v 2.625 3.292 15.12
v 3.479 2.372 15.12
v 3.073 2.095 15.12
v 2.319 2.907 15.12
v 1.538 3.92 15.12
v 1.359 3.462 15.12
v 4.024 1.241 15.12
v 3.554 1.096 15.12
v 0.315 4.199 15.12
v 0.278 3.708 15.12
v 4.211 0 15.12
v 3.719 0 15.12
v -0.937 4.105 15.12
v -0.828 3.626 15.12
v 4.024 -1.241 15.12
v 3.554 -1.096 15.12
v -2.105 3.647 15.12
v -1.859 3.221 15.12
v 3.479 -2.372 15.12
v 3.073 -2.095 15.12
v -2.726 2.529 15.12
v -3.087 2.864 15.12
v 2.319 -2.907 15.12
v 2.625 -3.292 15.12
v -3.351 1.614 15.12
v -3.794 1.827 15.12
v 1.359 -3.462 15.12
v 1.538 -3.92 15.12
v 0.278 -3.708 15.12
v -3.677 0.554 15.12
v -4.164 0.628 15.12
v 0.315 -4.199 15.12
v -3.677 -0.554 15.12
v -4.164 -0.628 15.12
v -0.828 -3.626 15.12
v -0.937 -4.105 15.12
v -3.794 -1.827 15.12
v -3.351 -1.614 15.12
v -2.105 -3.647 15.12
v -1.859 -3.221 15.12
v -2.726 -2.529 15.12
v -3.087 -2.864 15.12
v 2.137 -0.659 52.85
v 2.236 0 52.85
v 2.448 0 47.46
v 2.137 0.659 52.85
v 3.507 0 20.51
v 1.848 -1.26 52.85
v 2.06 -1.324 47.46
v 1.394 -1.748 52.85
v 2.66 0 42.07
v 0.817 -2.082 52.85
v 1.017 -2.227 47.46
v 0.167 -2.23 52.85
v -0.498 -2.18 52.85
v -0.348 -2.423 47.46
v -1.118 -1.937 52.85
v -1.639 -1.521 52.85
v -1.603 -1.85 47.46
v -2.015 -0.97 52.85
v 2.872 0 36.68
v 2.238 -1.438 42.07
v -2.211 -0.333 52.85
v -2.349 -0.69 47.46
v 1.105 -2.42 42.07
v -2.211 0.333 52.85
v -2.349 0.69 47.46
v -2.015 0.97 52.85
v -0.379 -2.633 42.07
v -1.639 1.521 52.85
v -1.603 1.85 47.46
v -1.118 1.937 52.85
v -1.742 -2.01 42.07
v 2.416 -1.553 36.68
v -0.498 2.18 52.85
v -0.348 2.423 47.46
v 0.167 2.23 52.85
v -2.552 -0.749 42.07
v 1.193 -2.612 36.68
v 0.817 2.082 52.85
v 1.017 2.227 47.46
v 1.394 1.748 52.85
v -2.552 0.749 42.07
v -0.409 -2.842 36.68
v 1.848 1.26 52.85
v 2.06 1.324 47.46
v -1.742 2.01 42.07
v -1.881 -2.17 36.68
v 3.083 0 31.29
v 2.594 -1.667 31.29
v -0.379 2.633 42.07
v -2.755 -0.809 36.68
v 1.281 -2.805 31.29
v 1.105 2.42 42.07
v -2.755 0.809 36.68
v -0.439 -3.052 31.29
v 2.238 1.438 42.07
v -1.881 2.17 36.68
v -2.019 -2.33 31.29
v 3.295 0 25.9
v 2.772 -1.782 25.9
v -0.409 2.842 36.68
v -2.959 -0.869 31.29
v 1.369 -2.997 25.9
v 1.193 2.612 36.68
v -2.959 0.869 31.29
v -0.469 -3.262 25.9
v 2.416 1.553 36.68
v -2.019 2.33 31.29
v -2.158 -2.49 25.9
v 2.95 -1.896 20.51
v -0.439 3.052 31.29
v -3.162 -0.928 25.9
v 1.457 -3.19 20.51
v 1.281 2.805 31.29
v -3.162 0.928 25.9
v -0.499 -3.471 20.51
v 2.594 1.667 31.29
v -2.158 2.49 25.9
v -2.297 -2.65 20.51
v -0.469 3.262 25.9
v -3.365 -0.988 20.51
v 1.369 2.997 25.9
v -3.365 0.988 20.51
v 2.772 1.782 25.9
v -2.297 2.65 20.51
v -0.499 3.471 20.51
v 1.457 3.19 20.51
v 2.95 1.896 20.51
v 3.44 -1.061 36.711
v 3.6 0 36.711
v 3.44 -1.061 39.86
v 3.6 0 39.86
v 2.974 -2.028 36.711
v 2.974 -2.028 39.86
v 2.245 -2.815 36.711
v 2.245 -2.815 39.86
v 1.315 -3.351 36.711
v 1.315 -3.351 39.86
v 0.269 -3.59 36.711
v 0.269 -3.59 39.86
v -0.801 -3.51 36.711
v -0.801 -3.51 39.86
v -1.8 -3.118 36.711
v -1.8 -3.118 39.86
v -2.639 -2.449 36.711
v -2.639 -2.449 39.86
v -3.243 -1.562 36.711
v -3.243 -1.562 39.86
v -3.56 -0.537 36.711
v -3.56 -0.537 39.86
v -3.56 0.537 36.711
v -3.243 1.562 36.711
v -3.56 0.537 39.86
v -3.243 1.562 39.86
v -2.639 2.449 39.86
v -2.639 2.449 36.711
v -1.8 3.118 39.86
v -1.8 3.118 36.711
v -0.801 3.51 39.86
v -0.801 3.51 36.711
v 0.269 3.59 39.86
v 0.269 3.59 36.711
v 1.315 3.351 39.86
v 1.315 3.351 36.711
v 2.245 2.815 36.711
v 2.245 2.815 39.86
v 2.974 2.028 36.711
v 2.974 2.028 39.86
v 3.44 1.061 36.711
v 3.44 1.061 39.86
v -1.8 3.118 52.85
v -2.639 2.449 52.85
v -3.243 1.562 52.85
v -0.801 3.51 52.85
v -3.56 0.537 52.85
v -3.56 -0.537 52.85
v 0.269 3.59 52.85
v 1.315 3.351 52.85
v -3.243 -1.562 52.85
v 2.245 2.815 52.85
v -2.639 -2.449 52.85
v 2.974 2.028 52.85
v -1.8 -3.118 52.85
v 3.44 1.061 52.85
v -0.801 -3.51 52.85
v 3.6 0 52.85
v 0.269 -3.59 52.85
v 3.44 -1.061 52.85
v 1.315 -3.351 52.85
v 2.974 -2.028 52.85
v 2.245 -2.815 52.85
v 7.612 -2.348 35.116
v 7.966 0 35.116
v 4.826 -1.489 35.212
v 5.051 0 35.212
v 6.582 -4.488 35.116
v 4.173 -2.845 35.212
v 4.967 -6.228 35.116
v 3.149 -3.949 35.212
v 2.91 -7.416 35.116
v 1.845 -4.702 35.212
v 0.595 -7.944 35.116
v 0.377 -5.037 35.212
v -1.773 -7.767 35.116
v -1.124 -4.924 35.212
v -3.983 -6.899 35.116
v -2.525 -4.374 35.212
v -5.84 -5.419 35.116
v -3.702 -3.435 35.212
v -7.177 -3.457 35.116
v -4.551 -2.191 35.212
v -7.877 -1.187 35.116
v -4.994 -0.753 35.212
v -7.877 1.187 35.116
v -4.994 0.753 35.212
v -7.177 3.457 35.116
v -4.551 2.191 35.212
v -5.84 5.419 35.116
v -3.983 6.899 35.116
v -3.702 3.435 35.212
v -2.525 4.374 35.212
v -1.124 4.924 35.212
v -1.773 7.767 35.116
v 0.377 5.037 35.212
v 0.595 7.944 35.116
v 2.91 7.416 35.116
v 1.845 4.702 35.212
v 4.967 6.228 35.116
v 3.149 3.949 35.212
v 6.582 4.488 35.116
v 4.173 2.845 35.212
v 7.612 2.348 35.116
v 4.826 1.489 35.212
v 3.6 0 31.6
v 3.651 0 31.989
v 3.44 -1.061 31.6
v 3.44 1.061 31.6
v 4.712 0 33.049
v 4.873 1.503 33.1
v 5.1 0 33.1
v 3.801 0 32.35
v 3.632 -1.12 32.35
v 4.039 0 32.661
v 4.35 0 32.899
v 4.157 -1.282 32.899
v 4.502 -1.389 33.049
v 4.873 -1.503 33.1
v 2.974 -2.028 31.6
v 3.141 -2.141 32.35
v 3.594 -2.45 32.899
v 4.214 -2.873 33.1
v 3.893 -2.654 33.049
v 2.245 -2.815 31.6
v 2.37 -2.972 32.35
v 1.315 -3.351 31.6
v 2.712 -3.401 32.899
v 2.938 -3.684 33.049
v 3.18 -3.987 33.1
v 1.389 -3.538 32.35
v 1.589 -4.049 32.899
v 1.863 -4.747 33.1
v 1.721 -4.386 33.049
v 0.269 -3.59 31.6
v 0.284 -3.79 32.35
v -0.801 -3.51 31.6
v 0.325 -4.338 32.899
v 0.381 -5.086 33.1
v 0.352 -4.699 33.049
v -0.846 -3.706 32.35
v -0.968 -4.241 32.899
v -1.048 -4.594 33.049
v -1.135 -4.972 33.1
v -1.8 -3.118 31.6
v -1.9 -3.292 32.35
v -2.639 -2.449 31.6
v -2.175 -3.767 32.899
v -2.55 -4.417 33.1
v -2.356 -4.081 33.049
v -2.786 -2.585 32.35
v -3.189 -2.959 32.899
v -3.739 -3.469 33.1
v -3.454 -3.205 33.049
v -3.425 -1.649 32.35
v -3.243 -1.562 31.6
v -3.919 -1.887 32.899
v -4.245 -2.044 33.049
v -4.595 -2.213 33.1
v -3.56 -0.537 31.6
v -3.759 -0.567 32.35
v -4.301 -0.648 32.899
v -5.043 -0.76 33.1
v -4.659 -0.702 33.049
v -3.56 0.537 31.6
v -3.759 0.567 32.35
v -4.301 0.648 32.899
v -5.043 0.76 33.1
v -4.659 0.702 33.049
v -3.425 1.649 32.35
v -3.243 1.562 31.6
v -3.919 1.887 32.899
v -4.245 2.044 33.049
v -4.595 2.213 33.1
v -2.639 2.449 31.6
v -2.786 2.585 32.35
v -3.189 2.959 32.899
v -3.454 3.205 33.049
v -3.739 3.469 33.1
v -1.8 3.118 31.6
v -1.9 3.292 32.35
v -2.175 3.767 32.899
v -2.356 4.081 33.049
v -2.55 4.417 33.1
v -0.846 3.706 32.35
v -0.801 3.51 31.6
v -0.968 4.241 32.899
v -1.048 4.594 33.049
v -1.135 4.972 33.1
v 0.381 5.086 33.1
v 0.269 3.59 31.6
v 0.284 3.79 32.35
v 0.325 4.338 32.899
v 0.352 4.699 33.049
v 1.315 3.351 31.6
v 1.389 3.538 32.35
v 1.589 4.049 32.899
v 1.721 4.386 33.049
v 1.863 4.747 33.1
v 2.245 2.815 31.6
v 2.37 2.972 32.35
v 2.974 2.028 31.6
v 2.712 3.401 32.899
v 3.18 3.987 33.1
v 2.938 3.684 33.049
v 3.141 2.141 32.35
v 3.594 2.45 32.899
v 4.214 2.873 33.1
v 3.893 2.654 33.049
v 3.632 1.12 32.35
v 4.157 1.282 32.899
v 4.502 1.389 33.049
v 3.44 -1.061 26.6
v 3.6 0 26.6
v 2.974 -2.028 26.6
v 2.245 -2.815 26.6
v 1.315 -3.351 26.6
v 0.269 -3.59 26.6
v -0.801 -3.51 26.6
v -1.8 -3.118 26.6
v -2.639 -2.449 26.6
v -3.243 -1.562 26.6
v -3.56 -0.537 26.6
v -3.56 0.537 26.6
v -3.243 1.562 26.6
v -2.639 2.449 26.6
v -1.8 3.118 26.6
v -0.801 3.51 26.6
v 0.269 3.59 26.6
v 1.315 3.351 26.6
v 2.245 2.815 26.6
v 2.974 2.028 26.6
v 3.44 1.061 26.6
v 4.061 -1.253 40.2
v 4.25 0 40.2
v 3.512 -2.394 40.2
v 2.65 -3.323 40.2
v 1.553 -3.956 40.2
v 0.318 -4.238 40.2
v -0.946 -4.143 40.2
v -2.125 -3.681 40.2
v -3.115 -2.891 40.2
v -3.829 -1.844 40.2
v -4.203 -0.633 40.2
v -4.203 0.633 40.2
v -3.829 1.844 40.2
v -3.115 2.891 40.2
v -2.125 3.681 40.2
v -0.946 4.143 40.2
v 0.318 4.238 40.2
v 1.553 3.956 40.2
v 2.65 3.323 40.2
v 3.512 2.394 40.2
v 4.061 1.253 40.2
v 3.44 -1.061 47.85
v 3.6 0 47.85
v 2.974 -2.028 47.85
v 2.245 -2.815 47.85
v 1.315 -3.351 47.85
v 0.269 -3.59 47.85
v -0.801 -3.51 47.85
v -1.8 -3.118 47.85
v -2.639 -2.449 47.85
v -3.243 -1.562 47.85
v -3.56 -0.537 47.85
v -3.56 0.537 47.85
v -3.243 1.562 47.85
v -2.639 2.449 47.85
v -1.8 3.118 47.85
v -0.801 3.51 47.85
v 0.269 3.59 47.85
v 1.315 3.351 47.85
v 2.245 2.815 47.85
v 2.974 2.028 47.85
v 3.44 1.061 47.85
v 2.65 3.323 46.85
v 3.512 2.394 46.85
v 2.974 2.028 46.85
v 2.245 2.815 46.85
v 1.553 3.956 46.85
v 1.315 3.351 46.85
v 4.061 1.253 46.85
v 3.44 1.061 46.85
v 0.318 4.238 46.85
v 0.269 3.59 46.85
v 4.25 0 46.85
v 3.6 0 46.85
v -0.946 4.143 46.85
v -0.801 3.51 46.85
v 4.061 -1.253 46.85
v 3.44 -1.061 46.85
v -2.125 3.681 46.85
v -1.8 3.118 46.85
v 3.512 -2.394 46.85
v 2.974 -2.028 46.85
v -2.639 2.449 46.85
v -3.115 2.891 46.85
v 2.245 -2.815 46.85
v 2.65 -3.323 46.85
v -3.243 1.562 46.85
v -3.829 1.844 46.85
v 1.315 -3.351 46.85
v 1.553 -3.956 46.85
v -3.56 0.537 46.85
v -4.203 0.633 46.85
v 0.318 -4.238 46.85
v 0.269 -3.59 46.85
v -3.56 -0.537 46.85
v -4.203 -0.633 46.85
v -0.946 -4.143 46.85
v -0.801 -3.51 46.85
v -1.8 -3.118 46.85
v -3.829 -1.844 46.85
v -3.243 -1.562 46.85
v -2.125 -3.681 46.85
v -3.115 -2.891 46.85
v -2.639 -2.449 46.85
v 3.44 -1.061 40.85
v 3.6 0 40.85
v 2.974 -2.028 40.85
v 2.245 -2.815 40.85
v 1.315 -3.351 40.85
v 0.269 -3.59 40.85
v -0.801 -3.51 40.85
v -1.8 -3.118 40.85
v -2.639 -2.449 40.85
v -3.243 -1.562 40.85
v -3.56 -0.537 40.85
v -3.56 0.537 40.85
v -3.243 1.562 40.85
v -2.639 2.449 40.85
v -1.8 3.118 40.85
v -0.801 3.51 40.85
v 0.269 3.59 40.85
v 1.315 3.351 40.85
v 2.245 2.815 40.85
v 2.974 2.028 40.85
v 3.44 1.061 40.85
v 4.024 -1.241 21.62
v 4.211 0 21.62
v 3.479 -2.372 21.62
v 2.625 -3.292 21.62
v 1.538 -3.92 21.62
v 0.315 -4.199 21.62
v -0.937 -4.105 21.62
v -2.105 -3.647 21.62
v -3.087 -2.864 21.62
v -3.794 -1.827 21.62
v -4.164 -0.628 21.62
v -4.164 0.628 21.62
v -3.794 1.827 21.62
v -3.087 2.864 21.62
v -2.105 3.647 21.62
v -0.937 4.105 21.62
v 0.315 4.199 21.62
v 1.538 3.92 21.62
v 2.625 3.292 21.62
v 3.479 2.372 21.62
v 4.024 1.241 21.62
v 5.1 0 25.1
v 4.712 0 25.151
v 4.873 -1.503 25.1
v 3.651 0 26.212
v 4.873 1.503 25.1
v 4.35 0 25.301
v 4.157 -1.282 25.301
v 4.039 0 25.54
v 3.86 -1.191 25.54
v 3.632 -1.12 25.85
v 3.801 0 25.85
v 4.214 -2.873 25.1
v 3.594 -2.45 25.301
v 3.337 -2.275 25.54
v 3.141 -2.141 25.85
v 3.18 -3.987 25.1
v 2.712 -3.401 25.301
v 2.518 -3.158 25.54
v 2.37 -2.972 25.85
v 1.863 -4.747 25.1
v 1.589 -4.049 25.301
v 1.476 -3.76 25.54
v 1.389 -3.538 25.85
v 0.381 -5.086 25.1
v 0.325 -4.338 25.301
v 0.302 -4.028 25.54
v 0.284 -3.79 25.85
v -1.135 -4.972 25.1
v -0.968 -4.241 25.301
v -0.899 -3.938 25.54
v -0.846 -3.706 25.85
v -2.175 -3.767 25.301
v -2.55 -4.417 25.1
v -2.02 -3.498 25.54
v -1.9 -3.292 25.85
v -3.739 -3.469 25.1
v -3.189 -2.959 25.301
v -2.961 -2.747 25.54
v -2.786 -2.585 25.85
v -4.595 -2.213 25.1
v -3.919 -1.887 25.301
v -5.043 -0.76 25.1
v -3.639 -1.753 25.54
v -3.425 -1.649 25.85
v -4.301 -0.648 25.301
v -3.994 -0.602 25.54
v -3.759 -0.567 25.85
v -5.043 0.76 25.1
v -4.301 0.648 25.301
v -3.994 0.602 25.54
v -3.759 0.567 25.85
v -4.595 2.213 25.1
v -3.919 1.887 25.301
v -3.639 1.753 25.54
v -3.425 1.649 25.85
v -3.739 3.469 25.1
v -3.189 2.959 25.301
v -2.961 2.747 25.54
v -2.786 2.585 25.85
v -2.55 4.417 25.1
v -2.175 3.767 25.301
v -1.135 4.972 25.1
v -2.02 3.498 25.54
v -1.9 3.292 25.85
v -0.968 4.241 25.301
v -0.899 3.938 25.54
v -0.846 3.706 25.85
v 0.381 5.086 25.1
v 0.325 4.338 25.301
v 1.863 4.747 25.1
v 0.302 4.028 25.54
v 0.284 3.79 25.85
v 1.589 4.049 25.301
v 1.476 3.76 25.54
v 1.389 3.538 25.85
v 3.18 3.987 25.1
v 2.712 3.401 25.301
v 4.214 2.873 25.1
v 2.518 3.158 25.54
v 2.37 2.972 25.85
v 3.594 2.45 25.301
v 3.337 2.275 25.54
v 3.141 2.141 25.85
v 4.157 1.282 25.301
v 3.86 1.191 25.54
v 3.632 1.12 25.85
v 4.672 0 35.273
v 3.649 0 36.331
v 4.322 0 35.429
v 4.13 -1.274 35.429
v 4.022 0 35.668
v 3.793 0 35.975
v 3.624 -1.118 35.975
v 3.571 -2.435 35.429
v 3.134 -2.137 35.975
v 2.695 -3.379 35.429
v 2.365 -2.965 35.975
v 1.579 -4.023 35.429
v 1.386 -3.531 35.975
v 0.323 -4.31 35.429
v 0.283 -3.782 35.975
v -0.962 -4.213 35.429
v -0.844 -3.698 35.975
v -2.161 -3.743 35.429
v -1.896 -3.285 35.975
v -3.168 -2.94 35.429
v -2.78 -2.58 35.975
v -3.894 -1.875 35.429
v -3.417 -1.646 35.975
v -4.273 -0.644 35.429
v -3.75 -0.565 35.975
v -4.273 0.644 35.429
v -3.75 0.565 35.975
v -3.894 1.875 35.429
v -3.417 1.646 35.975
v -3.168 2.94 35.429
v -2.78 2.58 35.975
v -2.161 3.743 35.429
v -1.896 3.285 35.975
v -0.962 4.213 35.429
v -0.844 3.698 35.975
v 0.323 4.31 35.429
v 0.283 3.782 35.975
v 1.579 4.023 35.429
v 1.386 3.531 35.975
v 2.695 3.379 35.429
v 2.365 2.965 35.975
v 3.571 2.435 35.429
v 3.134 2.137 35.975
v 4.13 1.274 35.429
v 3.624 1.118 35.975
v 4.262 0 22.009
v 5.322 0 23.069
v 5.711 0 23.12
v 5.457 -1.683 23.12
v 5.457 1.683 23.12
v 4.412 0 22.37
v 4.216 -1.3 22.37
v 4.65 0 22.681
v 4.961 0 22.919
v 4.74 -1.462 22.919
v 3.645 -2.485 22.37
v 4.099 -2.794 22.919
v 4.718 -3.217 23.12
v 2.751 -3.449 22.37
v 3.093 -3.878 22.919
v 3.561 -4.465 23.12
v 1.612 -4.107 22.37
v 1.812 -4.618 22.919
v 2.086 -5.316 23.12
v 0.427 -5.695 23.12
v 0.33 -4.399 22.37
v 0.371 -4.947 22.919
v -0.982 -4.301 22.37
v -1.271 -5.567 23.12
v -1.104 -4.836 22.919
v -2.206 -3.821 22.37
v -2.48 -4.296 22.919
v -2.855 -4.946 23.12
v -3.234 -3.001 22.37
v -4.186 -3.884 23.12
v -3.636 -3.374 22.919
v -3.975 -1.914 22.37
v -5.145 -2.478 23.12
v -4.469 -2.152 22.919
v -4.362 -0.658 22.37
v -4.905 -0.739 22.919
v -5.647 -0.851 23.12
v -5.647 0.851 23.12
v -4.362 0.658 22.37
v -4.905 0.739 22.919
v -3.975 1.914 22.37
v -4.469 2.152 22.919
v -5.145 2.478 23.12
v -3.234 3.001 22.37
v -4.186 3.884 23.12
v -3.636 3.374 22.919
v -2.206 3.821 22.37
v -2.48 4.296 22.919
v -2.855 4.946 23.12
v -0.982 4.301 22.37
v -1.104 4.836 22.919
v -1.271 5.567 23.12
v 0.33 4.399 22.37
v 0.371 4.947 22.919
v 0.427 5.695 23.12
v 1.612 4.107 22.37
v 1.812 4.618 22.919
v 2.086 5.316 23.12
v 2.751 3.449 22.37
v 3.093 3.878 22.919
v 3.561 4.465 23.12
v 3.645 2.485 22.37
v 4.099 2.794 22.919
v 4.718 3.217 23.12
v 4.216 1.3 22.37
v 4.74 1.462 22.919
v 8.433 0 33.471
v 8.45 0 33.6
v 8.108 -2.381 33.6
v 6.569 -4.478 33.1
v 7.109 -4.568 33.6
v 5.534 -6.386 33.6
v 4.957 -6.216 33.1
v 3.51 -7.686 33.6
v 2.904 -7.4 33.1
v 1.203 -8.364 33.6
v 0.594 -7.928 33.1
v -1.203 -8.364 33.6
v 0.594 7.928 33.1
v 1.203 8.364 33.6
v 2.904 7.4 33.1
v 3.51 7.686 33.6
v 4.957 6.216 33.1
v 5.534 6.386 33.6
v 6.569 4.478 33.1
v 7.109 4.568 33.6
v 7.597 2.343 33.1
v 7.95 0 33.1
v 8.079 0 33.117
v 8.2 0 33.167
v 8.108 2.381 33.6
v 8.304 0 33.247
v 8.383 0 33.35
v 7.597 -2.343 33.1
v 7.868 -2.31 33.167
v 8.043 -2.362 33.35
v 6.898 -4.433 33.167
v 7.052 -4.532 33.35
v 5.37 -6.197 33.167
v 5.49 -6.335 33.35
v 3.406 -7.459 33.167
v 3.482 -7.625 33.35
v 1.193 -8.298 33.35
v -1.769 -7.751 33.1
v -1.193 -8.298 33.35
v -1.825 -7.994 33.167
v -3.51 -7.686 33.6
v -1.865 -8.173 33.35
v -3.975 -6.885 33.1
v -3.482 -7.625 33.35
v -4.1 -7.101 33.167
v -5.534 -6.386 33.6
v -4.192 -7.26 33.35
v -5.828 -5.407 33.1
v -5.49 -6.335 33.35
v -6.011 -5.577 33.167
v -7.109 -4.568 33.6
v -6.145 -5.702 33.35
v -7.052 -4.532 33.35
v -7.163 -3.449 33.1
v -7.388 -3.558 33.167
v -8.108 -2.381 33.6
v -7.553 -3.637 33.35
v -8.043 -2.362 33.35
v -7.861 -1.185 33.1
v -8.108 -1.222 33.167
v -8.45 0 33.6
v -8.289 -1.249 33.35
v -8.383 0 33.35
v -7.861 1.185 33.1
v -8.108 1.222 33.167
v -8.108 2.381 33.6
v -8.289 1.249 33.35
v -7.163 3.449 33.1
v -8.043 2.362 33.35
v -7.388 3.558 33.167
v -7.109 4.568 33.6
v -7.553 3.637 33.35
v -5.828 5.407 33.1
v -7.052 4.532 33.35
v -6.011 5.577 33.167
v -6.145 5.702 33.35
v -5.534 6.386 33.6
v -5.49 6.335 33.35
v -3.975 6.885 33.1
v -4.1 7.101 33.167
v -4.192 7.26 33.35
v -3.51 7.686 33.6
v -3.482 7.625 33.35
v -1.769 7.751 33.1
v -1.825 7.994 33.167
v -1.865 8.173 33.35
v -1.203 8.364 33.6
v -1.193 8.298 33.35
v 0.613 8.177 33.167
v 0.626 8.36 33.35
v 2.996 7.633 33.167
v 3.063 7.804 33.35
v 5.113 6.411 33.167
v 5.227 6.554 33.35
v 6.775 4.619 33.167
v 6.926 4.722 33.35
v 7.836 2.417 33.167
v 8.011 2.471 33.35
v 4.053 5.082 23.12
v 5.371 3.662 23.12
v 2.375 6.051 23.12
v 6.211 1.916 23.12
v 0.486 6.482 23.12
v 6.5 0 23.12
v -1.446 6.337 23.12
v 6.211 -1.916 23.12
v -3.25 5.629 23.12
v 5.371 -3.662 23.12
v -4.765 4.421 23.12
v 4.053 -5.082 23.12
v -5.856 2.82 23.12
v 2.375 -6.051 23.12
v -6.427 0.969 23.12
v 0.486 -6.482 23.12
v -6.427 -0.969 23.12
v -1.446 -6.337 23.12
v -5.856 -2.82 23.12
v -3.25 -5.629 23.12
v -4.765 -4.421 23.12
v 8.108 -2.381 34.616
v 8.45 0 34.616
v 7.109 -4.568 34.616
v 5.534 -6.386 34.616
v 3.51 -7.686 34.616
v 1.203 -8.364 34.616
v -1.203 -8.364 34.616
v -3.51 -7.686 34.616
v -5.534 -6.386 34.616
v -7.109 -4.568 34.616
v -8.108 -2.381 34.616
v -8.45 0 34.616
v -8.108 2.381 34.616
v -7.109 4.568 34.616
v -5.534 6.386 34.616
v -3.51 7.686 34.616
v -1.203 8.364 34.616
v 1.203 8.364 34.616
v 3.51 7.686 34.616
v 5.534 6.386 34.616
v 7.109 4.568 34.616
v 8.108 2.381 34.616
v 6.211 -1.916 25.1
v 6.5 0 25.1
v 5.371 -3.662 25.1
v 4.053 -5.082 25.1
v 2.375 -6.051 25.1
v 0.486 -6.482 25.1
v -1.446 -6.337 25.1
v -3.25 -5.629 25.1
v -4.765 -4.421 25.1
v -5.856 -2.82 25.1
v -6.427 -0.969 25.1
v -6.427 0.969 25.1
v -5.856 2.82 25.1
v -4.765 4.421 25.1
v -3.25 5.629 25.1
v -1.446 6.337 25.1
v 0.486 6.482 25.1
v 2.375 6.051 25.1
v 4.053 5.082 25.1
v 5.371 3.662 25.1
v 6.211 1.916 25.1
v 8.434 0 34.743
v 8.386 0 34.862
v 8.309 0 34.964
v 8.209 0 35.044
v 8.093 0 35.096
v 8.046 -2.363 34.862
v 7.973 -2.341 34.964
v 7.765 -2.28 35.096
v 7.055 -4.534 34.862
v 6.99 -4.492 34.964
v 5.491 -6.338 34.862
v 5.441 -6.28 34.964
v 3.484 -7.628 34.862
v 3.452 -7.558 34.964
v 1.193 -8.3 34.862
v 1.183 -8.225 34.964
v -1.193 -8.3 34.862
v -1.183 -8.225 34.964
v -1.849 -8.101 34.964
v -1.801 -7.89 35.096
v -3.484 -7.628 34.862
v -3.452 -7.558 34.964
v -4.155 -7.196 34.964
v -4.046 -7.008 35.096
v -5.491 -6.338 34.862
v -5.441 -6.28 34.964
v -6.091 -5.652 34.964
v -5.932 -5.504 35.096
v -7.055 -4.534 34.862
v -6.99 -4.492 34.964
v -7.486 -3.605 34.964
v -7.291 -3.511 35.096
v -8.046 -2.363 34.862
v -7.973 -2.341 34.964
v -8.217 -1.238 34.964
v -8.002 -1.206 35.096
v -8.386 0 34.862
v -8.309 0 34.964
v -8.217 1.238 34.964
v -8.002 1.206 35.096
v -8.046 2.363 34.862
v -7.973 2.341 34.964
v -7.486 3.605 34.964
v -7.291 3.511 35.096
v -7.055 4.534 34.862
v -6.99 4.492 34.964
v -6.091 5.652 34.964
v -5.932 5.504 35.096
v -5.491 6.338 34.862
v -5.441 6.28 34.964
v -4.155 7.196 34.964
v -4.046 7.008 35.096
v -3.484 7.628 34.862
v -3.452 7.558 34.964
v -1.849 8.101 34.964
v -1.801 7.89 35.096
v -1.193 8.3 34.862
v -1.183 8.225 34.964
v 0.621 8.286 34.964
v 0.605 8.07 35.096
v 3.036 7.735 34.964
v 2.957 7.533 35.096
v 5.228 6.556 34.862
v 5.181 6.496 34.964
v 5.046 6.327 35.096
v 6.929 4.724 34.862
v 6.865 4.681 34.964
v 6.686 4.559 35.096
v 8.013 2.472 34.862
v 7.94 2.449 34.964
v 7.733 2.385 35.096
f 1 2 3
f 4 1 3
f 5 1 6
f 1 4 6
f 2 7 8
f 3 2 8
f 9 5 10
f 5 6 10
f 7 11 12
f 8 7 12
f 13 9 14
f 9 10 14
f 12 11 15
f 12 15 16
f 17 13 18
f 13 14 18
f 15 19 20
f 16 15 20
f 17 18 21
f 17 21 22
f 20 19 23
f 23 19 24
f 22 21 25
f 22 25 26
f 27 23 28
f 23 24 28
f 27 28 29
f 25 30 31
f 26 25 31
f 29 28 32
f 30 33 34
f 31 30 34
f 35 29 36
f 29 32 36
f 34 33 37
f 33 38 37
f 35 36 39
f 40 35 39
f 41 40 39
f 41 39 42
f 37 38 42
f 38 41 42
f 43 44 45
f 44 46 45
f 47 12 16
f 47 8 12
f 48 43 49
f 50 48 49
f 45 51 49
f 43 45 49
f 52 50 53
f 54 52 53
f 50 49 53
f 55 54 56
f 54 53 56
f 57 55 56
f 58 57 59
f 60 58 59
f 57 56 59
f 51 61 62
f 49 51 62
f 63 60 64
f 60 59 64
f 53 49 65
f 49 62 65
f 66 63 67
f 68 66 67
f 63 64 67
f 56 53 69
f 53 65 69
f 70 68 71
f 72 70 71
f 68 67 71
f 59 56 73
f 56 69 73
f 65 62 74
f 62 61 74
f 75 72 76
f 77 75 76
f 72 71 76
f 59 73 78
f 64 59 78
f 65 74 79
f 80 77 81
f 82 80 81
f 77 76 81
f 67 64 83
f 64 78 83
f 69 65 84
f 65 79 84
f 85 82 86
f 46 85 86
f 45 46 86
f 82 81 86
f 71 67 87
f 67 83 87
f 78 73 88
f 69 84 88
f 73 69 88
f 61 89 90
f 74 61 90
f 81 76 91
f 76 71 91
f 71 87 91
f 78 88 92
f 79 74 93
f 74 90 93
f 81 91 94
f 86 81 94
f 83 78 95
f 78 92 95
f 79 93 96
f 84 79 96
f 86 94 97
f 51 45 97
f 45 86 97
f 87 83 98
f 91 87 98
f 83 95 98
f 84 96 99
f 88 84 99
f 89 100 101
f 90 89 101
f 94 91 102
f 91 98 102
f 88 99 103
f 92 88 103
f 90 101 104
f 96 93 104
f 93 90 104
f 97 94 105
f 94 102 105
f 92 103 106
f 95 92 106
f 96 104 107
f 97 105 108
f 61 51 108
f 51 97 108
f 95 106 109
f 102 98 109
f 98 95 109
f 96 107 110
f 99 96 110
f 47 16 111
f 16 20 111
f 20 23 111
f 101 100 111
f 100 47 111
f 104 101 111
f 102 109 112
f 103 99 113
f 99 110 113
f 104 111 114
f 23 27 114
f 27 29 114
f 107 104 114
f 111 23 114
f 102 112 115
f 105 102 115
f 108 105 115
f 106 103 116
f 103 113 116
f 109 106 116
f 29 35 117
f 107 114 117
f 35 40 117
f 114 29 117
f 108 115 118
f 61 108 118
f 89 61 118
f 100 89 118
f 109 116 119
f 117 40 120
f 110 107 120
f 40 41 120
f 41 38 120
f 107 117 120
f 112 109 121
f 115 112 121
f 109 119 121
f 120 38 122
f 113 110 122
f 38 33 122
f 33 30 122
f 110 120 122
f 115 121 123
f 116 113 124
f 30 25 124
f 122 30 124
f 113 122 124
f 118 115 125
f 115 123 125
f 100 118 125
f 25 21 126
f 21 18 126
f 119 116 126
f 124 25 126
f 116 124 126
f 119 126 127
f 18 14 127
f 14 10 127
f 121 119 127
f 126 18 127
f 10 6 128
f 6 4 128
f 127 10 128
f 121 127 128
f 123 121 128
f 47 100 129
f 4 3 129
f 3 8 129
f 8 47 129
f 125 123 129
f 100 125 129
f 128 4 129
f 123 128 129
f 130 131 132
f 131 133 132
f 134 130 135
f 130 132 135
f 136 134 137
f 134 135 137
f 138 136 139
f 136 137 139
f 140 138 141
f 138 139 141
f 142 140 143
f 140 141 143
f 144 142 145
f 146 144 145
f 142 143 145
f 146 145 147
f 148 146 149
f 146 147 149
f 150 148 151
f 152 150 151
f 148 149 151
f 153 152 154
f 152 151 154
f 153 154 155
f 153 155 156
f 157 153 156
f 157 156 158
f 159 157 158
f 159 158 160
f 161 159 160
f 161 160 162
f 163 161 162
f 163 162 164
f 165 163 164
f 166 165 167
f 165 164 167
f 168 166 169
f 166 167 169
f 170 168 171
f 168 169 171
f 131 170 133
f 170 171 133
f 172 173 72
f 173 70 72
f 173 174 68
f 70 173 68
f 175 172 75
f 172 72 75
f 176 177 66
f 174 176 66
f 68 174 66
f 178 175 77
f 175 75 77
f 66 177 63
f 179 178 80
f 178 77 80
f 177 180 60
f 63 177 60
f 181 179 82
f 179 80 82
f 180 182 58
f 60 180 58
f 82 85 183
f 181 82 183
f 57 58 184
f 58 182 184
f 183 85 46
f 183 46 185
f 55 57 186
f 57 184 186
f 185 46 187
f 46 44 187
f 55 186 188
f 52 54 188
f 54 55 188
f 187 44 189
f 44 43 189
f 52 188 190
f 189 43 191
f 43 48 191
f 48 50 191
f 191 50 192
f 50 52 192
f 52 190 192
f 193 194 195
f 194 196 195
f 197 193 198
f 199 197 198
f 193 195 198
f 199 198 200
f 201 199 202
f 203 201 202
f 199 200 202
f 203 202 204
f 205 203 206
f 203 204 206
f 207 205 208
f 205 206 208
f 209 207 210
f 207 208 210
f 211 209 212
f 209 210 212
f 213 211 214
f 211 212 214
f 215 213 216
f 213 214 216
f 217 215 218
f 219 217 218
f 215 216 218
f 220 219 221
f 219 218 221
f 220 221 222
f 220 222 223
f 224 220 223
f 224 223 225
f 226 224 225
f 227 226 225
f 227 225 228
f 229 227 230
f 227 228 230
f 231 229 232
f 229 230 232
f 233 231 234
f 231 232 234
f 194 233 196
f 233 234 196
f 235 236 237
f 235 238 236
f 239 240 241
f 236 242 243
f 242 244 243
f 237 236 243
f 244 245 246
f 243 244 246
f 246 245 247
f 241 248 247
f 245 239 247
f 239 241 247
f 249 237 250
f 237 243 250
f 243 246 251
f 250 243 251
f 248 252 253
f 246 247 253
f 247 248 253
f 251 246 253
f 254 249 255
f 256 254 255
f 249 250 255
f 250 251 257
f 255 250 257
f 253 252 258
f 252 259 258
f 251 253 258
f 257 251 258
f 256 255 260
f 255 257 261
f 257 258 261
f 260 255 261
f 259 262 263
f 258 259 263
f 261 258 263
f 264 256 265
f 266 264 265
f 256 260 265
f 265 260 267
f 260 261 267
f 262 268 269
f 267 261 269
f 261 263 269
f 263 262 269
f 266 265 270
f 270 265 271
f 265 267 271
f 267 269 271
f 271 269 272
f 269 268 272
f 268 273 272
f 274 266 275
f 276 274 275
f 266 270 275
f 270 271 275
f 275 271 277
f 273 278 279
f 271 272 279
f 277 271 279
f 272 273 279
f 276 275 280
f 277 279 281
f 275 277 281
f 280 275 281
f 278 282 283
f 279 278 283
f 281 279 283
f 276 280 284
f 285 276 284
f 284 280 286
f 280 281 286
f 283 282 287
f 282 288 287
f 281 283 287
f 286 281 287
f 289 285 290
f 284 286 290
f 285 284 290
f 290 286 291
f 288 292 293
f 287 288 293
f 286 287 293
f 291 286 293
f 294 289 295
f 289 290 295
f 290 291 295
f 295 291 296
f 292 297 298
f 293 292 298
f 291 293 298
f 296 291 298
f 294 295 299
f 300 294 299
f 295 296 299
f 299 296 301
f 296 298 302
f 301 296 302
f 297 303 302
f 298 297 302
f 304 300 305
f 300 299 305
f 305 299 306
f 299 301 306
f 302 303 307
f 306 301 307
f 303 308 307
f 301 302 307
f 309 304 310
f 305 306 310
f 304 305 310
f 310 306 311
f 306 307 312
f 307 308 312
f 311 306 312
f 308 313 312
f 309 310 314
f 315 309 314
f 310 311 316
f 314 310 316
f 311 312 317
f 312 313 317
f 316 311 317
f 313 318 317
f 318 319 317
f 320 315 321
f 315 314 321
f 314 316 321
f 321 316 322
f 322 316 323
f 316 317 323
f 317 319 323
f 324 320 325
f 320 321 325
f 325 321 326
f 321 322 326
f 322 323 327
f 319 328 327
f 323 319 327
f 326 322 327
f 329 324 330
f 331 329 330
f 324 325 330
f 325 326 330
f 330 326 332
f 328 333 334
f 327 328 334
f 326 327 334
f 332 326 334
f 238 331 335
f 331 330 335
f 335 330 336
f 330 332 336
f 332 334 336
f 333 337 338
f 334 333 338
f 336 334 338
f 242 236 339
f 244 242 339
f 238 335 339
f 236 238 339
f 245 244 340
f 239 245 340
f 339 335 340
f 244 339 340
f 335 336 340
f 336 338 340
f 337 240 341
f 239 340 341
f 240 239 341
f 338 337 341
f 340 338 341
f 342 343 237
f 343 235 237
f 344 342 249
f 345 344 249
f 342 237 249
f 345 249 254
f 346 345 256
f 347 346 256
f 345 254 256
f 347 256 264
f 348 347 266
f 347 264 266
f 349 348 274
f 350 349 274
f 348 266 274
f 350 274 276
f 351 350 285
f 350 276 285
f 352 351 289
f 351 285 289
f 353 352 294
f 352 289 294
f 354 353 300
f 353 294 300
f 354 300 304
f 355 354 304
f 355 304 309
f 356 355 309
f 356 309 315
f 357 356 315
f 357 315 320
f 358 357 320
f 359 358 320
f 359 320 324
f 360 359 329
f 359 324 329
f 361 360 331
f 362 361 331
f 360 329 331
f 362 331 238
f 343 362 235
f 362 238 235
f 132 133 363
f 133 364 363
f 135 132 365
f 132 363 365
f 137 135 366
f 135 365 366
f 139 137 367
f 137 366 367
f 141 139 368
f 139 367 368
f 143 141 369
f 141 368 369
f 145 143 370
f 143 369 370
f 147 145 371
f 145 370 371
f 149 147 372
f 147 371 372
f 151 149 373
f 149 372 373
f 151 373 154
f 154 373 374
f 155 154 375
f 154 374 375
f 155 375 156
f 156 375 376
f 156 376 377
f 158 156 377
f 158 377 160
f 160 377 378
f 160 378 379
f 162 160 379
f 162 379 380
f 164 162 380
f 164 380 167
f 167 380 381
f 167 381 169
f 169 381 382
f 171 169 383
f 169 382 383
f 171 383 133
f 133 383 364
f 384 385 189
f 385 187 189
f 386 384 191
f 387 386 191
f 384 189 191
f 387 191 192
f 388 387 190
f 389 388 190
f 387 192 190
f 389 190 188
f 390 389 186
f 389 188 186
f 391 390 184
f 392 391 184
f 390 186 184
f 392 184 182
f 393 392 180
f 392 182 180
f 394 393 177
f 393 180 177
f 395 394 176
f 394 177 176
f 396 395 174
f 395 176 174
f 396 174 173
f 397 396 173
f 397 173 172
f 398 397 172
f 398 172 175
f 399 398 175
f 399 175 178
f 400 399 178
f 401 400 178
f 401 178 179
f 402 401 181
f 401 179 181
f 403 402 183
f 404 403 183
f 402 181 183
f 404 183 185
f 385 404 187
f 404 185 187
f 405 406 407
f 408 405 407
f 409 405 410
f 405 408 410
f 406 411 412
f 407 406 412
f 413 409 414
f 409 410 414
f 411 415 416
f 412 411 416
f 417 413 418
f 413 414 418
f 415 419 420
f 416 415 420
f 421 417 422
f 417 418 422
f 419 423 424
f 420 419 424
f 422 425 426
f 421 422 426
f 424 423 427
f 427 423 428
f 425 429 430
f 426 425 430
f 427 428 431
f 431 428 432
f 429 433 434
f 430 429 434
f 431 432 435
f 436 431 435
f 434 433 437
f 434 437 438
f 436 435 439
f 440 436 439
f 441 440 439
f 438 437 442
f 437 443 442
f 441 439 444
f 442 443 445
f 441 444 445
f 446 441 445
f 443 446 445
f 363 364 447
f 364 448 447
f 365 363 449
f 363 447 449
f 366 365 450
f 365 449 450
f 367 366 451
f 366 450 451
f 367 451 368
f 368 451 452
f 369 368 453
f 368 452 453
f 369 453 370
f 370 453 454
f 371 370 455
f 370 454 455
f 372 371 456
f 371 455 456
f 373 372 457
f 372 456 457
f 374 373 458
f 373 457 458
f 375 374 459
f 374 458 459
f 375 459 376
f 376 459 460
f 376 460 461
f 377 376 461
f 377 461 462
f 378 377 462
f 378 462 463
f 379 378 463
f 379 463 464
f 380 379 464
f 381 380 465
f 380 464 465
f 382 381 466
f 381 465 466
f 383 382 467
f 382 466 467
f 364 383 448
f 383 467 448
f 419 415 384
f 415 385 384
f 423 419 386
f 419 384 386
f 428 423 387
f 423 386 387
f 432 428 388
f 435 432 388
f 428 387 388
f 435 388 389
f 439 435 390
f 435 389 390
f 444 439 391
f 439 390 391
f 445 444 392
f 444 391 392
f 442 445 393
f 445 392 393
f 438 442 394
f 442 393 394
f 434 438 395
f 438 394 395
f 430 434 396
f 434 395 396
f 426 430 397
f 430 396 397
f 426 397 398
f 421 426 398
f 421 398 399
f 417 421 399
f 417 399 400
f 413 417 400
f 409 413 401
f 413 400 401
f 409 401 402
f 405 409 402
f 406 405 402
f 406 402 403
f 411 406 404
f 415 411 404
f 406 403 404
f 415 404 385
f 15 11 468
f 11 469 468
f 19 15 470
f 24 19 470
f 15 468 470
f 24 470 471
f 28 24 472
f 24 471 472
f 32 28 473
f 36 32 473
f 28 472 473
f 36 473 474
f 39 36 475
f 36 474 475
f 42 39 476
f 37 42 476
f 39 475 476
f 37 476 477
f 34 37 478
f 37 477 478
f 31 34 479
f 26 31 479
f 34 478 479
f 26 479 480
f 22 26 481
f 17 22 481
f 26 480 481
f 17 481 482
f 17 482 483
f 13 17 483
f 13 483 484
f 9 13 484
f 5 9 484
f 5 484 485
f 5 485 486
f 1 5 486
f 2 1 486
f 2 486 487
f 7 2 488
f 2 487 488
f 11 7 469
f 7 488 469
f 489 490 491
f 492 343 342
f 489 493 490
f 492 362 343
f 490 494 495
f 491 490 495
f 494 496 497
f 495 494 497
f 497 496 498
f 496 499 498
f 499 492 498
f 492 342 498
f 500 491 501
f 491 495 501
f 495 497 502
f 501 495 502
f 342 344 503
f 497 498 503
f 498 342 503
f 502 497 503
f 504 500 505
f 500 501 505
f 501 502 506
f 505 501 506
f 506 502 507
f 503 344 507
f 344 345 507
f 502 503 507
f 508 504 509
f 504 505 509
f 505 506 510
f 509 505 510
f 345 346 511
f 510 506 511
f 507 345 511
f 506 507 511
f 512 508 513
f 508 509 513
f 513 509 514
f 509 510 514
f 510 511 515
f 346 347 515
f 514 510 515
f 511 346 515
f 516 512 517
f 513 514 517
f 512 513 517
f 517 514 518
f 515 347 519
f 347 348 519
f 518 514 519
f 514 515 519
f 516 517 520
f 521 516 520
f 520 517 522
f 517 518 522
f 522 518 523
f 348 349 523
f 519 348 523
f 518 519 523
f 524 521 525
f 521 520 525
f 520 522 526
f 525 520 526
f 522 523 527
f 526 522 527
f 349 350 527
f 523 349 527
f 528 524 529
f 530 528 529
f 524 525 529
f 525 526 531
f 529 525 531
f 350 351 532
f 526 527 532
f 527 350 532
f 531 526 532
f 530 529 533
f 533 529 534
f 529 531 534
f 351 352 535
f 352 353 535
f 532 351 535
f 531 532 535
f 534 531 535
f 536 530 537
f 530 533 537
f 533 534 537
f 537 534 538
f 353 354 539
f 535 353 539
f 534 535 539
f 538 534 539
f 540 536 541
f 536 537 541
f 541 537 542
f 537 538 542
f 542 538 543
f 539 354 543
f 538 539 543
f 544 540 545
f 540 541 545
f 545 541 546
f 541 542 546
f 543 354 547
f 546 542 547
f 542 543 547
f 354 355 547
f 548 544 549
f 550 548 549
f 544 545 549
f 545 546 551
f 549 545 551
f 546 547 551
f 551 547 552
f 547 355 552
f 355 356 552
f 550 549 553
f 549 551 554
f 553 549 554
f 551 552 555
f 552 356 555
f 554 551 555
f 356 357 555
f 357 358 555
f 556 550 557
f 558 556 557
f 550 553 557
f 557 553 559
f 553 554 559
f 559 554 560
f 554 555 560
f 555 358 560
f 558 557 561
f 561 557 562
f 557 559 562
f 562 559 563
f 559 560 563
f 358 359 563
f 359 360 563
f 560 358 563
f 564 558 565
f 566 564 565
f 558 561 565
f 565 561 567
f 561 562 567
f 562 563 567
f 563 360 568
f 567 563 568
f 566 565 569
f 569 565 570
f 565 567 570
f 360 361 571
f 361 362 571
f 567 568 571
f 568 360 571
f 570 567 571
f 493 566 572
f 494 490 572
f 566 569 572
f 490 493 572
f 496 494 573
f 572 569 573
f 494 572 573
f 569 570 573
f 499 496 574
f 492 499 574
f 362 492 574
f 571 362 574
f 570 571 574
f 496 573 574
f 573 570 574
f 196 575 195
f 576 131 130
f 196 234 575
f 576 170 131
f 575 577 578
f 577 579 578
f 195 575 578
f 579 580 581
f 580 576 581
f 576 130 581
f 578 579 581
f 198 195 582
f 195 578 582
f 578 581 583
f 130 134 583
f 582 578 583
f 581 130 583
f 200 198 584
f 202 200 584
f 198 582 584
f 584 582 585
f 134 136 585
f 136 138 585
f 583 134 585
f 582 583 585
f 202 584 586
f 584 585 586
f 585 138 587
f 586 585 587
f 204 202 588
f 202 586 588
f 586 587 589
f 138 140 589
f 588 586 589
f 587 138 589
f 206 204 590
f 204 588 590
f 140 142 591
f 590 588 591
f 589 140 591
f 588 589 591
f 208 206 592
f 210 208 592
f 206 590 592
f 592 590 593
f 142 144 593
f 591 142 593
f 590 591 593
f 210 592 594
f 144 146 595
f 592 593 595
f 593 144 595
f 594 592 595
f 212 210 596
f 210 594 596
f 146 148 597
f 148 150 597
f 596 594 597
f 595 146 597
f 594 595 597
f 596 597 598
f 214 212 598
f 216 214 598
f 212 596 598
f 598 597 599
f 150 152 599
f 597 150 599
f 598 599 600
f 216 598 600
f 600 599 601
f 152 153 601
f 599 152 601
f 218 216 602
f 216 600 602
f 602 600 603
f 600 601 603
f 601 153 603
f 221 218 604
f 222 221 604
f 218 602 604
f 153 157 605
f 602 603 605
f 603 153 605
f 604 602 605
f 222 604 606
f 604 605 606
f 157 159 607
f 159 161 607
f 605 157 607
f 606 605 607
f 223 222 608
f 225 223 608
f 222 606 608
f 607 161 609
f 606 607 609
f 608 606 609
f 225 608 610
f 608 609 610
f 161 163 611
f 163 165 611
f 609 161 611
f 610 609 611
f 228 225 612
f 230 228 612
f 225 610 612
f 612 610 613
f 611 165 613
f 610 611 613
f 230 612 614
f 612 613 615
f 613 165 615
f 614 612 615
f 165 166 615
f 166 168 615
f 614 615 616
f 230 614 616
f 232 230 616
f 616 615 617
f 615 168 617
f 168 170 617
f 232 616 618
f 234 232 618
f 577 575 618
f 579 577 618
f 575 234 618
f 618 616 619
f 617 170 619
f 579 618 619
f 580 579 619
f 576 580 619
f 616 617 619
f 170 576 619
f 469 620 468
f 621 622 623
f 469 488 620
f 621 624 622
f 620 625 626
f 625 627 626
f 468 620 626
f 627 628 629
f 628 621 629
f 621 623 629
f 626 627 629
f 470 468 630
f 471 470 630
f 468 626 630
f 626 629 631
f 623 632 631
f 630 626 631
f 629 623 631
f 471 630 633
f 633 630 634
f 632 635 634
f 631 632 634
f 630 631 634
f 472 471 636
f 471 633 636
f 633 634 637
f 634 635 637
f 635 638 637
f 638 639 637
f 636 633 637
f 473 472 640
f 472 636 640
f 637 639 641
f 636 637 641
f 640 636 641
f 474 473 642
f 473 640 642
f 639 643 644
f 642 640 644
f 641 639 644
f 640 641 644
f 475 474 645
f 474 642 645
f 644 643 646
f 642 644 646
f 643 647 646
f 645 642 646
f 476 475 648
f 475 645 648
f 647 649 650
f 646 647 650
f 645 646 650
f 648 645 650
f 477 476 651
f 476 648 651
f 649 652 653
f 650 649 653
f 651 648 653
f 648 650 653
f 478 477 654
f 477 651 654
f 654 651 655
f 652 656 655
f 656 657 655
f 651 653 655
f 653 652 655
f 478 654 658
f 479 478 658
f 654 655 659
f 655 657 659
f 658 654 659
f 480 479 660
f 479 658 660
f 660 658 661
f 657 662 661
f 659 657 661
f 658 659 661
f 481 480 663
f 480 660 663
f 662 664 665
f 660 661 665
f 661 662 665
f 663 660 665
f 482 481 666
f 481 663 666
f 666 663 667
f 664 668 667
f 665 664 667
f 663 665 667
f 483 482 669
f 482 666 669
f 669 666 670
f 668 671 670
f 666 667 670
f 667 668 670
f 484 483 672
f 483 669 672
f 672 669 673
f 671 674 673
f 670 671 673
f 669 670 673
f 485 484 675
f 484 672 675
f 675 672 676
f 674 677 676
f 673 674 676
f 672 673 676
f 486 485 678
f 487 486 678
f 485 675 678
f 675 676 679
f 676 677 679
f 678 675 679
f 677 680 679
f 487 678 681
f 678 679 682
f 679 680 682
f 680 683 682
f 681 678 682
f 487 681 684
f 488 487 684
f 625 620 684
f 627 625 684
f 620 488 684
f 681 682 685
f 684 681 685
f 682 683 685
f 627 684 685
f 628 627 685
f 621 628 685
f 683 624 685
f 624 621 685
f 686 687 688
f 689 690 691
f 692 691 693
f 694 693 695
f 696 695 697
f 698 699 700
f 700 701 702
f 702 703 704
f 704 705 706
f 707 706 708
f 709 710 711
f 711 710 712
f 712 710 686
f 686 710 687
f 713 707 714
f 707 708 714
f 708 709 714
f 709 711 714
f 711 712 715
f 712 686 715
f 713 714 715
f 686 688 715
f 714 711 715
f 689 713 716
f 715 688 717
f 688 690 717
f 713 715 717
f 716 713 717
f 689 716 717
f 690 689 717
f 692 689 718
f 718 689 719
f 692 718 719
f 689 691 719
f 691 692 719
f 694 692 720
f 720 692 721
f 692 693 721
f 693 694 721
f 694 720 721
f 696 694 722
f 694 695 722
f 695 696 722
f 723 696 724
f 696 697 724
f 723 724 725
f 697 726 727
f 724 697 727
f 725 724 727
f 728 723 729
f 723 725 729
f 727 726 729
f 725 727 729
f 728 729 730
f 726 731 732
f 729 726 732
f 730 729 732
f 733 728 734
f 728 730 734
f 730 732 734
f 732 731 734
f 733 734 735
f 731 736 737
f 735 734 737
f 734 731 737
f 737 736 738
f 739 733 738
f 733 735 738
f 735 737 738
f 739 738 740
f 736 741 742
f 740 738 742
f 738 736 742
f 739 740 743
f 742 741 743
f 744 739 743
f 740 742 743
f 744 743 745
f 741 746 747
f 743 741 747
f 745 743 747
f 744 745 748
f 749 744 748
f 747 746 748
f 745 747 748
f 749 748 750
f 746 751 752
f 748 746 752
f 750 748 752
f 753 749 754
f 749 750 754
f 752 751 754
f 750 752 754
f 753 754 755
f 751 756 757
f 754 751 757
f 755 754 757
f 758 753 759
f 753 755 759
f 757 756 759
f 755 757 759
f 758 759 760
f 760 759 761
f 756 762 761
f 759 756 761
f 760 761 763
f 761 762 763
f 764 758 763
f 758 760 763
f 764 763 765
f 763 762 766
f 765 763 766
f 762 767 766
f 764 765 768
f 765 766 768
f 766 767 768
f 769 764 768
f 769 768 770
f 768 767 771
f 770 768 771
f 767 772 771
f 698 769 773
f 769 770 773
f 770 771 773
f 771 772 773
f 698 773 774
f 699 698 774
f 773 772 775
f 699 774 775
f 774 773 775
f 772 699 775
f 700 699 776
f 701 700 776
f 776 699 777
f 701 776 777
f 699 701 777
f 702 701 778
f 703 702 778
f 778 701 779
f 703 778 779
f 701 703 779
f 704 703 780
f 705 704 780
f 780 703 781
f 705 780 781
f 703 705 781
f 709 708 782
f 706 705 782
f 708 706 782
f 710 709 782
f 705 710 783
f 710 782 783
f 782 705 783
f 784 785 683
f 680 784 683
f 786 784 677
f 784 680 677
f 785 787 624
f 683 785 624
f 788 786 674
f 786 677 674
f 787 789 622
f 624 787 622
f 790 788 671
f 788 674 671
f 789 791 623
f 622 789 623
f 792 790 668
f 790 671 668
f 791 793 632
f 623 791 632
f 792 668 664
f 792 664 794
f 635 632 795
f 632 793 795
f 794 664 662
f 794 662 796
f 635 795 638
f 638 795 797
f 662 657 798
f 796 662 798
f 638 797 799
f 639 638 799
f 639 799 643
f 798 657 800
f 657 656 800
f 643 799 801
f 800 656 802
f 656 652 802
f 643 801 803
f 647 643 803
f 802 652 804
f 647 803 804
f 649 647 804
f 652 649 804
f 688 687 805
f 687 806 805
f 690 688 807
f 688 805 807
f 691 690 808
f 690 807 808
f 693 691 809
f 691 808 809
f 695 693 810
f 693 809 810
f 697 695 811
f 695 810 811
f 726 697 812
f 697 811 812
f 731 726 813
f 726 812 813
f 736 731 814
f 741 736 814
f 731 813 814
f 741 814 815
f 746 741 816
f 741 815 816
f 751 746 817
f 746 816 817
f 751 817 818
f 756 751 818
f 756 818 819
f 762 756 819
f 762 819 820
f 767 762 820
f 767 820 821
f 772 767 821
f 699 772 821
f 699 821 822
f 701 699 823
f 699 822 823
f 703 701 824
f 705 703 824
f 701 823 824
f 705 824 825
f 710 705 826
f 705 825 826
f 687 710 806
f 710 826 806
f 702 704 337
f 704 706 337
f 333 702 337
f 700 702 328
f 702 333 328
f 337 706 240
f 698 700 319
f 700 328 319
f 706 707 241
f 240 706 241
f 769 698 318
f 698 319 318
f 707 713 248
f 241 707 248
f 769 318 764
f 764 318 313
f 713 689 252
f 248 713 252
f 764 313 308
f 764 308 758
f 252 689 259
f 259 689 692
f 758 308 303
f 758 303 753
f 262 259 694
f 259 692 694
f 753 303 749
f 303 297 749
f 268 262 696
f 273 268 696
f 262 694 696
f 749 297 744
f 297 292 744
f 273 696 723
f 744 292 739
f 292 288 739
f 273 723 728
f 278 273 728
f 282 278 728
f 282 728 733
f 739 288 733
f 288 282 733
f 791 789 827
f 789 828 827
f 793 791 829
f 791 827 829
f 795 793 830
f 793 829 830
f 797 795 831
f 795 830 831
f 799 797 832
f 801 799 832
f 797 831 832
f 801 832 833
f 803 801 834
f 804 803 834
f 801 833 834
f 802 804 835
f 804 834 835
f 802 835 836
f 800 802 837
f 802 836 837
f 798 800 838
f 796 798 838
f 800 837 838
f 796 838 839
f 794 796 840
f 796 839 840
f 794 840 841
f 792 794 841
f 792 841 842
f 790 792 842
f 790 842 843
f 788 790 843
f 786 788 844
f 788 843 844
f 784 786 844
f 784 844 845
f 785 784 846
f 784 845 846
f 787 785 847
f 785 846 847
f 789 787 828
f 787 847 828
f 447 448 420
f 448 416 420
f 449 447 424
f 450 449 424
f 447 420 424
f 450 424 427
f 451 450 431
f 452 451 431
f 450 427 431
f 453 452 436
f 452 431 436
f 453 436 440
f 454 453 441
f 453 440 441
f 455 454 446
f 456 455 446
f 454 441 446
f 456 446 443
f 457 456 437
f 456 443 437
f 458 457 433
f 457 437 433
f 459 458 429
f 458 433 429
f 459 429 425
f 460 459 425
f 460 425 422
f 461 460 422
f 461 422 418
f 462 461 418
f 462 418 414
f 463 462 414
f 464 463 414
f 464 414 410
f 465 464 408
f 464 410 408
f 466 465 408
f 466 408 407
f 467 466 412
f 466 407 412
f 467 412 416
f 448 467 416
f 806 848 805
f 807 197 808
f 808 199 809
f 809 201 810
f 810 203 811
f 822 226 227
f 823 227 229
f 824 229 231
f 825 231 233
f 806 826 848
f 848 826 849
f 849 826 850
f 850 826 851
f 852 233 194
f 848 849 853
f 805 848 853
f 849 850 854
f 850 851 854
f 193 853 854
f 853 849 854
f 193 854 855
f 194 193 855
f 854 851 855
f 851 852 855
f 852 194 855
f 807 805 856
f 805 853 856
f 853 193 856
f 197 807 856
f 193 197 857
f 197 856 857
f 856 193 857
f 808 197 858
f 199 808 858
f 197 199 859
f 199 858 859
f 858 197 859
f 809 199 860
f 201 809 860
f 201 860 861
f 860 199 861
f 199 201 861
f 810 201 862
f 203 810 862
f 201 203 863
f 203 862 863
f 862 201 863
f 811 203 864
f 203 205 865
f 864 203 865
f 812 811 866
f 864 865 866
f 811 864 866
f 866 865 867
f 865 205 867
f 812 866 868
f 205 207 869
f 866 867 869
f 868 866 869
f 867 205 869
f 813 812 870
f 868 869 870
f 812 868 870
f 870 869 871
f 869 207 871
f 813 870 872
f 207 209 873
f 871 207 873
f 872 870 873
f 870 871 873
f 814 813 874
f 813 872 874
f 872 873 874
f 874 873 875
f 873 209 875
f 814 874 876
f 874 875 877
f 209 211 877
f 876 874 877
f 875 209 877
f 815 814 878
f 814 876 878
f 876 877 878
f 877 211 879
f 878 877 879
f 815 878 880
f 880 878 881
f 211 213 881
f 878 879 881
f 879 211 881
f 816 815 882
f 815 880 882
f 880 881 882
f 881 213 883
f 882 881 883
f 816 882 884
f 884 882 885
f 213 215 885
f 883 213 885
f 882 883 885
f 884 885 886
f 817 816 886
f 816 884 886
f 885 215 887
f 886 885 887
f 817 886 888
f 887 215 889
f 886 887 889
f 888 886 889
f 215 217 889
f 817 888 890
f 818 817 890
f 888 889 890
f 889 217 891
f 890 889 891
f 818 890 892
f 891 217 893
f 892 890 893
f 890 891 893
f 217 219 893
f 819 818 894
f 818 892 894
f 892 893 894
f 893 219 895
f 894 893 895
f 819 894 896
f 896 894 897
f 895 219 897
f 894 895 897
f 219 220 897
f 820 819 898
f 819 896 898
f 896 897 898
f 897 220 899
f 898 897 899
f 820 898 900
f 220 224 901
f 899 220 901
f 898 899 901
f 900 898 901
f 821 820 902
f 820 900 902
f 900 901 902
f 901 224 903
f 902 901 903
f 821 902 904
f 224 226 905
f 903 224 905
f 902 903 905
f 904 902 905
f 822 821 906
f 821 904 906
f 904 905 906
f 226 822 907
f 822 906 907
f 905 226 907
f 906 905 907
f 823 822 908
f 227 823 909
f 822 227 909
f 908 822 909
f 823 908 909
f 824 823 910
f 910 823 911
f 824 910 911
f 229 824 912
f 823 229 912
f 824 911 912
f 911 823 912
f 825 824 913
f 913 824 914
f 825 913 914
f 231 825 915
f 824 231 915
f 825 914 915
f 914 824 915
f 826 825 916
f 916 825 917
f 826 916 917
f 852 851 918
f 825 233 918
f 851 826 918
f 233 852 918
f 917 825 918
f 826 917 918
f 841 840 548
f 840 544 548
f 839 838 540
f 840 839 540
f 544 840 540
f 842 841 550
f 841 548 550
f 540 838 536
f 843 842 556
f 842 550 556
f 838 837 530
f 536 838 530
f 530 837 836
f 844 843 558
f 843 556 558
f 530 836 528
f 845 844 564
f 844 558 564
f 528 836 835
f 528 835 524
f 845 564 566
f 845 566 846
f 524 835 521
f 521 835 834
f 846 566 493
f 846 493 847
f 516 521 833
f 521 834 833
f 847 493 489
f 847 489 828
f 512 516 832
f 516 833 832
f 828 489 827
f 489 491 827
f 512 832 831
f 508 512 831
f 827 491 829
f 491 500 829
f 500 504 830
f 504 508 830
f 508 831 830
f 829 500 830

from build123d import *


with BuildPart() as f1:
    # F0 (on Front) → F1 (revolve)
    with BuildSketch(Plane.XZ):
        with BuildLine():
            Line((3.6, 47.850312), (3.6, 52.850312))
            Line((3.6, 52.850312), (2.236389, 52.850312))
            Line((2.236389, 52.850312), (3.718804, 15.120346))
            Line((3.718804, 15.120346), (4.210656, 15.120346))
            Line((4.210656, 15.120346), (4.210656, 21.620346))
            ThreePointArc((4.210656, 21.620346), (4.649996, 22.681006), (5.710656, 23.120346))
            Line((5.710656, 23.120346), (6.5, 23.120346))
            Line((6.5, 23.120346), (6.5, 25.100315))
            Line((6.5, 25.100315), (5.1, 25.100315))
            ThreePointArc((5.1, 25.100315), (4.03934, 25.539655), (3.6, 26.600315))
            Line((3.6, 26.600315), (3.6, 31.600315))
            ThreePointArc((3.6, 31.600315), (4.03934, 32.660976), (5.1, 33.100315))
            Line((5.1, 33.100315), (7.95, 33.100315))
            ThreePointArc((7.95, 33.100315), (8.303553, 33.246762), (8.45, 33.600315))
            Line((8.45, 33.600315), (8.45, 34.616477))
            ThreePointArc((8.45, 34.616477), (8.309313, 34.964176), (7.966423, 35.116207))
            Line((7.966423, 35.116207), (5.050732, 35.212025))
            ThreePointArc((5.050732, 35.212025), (4.022062, 35.66812), (3.6, 36.711216))
            Line((3.6, 36.711216), (3.6, 39.8597))
            Line((3.6, 39.8597), (4.25, 40.200312))
            Line((4.25, 40.200312), (3.6, 40.850312))
            Line((3.6, 40.850312), (3.6, 46.850312))
            Line((3.6, 46.850312), (4.25, 46.850312))
            Line((4.25, 46.850312), (3.6, 47.850312))
        make_face()
    revolve(axis=Axis((0, 0, 34.050312), (0, 0, -1)))


solid = f1.part
